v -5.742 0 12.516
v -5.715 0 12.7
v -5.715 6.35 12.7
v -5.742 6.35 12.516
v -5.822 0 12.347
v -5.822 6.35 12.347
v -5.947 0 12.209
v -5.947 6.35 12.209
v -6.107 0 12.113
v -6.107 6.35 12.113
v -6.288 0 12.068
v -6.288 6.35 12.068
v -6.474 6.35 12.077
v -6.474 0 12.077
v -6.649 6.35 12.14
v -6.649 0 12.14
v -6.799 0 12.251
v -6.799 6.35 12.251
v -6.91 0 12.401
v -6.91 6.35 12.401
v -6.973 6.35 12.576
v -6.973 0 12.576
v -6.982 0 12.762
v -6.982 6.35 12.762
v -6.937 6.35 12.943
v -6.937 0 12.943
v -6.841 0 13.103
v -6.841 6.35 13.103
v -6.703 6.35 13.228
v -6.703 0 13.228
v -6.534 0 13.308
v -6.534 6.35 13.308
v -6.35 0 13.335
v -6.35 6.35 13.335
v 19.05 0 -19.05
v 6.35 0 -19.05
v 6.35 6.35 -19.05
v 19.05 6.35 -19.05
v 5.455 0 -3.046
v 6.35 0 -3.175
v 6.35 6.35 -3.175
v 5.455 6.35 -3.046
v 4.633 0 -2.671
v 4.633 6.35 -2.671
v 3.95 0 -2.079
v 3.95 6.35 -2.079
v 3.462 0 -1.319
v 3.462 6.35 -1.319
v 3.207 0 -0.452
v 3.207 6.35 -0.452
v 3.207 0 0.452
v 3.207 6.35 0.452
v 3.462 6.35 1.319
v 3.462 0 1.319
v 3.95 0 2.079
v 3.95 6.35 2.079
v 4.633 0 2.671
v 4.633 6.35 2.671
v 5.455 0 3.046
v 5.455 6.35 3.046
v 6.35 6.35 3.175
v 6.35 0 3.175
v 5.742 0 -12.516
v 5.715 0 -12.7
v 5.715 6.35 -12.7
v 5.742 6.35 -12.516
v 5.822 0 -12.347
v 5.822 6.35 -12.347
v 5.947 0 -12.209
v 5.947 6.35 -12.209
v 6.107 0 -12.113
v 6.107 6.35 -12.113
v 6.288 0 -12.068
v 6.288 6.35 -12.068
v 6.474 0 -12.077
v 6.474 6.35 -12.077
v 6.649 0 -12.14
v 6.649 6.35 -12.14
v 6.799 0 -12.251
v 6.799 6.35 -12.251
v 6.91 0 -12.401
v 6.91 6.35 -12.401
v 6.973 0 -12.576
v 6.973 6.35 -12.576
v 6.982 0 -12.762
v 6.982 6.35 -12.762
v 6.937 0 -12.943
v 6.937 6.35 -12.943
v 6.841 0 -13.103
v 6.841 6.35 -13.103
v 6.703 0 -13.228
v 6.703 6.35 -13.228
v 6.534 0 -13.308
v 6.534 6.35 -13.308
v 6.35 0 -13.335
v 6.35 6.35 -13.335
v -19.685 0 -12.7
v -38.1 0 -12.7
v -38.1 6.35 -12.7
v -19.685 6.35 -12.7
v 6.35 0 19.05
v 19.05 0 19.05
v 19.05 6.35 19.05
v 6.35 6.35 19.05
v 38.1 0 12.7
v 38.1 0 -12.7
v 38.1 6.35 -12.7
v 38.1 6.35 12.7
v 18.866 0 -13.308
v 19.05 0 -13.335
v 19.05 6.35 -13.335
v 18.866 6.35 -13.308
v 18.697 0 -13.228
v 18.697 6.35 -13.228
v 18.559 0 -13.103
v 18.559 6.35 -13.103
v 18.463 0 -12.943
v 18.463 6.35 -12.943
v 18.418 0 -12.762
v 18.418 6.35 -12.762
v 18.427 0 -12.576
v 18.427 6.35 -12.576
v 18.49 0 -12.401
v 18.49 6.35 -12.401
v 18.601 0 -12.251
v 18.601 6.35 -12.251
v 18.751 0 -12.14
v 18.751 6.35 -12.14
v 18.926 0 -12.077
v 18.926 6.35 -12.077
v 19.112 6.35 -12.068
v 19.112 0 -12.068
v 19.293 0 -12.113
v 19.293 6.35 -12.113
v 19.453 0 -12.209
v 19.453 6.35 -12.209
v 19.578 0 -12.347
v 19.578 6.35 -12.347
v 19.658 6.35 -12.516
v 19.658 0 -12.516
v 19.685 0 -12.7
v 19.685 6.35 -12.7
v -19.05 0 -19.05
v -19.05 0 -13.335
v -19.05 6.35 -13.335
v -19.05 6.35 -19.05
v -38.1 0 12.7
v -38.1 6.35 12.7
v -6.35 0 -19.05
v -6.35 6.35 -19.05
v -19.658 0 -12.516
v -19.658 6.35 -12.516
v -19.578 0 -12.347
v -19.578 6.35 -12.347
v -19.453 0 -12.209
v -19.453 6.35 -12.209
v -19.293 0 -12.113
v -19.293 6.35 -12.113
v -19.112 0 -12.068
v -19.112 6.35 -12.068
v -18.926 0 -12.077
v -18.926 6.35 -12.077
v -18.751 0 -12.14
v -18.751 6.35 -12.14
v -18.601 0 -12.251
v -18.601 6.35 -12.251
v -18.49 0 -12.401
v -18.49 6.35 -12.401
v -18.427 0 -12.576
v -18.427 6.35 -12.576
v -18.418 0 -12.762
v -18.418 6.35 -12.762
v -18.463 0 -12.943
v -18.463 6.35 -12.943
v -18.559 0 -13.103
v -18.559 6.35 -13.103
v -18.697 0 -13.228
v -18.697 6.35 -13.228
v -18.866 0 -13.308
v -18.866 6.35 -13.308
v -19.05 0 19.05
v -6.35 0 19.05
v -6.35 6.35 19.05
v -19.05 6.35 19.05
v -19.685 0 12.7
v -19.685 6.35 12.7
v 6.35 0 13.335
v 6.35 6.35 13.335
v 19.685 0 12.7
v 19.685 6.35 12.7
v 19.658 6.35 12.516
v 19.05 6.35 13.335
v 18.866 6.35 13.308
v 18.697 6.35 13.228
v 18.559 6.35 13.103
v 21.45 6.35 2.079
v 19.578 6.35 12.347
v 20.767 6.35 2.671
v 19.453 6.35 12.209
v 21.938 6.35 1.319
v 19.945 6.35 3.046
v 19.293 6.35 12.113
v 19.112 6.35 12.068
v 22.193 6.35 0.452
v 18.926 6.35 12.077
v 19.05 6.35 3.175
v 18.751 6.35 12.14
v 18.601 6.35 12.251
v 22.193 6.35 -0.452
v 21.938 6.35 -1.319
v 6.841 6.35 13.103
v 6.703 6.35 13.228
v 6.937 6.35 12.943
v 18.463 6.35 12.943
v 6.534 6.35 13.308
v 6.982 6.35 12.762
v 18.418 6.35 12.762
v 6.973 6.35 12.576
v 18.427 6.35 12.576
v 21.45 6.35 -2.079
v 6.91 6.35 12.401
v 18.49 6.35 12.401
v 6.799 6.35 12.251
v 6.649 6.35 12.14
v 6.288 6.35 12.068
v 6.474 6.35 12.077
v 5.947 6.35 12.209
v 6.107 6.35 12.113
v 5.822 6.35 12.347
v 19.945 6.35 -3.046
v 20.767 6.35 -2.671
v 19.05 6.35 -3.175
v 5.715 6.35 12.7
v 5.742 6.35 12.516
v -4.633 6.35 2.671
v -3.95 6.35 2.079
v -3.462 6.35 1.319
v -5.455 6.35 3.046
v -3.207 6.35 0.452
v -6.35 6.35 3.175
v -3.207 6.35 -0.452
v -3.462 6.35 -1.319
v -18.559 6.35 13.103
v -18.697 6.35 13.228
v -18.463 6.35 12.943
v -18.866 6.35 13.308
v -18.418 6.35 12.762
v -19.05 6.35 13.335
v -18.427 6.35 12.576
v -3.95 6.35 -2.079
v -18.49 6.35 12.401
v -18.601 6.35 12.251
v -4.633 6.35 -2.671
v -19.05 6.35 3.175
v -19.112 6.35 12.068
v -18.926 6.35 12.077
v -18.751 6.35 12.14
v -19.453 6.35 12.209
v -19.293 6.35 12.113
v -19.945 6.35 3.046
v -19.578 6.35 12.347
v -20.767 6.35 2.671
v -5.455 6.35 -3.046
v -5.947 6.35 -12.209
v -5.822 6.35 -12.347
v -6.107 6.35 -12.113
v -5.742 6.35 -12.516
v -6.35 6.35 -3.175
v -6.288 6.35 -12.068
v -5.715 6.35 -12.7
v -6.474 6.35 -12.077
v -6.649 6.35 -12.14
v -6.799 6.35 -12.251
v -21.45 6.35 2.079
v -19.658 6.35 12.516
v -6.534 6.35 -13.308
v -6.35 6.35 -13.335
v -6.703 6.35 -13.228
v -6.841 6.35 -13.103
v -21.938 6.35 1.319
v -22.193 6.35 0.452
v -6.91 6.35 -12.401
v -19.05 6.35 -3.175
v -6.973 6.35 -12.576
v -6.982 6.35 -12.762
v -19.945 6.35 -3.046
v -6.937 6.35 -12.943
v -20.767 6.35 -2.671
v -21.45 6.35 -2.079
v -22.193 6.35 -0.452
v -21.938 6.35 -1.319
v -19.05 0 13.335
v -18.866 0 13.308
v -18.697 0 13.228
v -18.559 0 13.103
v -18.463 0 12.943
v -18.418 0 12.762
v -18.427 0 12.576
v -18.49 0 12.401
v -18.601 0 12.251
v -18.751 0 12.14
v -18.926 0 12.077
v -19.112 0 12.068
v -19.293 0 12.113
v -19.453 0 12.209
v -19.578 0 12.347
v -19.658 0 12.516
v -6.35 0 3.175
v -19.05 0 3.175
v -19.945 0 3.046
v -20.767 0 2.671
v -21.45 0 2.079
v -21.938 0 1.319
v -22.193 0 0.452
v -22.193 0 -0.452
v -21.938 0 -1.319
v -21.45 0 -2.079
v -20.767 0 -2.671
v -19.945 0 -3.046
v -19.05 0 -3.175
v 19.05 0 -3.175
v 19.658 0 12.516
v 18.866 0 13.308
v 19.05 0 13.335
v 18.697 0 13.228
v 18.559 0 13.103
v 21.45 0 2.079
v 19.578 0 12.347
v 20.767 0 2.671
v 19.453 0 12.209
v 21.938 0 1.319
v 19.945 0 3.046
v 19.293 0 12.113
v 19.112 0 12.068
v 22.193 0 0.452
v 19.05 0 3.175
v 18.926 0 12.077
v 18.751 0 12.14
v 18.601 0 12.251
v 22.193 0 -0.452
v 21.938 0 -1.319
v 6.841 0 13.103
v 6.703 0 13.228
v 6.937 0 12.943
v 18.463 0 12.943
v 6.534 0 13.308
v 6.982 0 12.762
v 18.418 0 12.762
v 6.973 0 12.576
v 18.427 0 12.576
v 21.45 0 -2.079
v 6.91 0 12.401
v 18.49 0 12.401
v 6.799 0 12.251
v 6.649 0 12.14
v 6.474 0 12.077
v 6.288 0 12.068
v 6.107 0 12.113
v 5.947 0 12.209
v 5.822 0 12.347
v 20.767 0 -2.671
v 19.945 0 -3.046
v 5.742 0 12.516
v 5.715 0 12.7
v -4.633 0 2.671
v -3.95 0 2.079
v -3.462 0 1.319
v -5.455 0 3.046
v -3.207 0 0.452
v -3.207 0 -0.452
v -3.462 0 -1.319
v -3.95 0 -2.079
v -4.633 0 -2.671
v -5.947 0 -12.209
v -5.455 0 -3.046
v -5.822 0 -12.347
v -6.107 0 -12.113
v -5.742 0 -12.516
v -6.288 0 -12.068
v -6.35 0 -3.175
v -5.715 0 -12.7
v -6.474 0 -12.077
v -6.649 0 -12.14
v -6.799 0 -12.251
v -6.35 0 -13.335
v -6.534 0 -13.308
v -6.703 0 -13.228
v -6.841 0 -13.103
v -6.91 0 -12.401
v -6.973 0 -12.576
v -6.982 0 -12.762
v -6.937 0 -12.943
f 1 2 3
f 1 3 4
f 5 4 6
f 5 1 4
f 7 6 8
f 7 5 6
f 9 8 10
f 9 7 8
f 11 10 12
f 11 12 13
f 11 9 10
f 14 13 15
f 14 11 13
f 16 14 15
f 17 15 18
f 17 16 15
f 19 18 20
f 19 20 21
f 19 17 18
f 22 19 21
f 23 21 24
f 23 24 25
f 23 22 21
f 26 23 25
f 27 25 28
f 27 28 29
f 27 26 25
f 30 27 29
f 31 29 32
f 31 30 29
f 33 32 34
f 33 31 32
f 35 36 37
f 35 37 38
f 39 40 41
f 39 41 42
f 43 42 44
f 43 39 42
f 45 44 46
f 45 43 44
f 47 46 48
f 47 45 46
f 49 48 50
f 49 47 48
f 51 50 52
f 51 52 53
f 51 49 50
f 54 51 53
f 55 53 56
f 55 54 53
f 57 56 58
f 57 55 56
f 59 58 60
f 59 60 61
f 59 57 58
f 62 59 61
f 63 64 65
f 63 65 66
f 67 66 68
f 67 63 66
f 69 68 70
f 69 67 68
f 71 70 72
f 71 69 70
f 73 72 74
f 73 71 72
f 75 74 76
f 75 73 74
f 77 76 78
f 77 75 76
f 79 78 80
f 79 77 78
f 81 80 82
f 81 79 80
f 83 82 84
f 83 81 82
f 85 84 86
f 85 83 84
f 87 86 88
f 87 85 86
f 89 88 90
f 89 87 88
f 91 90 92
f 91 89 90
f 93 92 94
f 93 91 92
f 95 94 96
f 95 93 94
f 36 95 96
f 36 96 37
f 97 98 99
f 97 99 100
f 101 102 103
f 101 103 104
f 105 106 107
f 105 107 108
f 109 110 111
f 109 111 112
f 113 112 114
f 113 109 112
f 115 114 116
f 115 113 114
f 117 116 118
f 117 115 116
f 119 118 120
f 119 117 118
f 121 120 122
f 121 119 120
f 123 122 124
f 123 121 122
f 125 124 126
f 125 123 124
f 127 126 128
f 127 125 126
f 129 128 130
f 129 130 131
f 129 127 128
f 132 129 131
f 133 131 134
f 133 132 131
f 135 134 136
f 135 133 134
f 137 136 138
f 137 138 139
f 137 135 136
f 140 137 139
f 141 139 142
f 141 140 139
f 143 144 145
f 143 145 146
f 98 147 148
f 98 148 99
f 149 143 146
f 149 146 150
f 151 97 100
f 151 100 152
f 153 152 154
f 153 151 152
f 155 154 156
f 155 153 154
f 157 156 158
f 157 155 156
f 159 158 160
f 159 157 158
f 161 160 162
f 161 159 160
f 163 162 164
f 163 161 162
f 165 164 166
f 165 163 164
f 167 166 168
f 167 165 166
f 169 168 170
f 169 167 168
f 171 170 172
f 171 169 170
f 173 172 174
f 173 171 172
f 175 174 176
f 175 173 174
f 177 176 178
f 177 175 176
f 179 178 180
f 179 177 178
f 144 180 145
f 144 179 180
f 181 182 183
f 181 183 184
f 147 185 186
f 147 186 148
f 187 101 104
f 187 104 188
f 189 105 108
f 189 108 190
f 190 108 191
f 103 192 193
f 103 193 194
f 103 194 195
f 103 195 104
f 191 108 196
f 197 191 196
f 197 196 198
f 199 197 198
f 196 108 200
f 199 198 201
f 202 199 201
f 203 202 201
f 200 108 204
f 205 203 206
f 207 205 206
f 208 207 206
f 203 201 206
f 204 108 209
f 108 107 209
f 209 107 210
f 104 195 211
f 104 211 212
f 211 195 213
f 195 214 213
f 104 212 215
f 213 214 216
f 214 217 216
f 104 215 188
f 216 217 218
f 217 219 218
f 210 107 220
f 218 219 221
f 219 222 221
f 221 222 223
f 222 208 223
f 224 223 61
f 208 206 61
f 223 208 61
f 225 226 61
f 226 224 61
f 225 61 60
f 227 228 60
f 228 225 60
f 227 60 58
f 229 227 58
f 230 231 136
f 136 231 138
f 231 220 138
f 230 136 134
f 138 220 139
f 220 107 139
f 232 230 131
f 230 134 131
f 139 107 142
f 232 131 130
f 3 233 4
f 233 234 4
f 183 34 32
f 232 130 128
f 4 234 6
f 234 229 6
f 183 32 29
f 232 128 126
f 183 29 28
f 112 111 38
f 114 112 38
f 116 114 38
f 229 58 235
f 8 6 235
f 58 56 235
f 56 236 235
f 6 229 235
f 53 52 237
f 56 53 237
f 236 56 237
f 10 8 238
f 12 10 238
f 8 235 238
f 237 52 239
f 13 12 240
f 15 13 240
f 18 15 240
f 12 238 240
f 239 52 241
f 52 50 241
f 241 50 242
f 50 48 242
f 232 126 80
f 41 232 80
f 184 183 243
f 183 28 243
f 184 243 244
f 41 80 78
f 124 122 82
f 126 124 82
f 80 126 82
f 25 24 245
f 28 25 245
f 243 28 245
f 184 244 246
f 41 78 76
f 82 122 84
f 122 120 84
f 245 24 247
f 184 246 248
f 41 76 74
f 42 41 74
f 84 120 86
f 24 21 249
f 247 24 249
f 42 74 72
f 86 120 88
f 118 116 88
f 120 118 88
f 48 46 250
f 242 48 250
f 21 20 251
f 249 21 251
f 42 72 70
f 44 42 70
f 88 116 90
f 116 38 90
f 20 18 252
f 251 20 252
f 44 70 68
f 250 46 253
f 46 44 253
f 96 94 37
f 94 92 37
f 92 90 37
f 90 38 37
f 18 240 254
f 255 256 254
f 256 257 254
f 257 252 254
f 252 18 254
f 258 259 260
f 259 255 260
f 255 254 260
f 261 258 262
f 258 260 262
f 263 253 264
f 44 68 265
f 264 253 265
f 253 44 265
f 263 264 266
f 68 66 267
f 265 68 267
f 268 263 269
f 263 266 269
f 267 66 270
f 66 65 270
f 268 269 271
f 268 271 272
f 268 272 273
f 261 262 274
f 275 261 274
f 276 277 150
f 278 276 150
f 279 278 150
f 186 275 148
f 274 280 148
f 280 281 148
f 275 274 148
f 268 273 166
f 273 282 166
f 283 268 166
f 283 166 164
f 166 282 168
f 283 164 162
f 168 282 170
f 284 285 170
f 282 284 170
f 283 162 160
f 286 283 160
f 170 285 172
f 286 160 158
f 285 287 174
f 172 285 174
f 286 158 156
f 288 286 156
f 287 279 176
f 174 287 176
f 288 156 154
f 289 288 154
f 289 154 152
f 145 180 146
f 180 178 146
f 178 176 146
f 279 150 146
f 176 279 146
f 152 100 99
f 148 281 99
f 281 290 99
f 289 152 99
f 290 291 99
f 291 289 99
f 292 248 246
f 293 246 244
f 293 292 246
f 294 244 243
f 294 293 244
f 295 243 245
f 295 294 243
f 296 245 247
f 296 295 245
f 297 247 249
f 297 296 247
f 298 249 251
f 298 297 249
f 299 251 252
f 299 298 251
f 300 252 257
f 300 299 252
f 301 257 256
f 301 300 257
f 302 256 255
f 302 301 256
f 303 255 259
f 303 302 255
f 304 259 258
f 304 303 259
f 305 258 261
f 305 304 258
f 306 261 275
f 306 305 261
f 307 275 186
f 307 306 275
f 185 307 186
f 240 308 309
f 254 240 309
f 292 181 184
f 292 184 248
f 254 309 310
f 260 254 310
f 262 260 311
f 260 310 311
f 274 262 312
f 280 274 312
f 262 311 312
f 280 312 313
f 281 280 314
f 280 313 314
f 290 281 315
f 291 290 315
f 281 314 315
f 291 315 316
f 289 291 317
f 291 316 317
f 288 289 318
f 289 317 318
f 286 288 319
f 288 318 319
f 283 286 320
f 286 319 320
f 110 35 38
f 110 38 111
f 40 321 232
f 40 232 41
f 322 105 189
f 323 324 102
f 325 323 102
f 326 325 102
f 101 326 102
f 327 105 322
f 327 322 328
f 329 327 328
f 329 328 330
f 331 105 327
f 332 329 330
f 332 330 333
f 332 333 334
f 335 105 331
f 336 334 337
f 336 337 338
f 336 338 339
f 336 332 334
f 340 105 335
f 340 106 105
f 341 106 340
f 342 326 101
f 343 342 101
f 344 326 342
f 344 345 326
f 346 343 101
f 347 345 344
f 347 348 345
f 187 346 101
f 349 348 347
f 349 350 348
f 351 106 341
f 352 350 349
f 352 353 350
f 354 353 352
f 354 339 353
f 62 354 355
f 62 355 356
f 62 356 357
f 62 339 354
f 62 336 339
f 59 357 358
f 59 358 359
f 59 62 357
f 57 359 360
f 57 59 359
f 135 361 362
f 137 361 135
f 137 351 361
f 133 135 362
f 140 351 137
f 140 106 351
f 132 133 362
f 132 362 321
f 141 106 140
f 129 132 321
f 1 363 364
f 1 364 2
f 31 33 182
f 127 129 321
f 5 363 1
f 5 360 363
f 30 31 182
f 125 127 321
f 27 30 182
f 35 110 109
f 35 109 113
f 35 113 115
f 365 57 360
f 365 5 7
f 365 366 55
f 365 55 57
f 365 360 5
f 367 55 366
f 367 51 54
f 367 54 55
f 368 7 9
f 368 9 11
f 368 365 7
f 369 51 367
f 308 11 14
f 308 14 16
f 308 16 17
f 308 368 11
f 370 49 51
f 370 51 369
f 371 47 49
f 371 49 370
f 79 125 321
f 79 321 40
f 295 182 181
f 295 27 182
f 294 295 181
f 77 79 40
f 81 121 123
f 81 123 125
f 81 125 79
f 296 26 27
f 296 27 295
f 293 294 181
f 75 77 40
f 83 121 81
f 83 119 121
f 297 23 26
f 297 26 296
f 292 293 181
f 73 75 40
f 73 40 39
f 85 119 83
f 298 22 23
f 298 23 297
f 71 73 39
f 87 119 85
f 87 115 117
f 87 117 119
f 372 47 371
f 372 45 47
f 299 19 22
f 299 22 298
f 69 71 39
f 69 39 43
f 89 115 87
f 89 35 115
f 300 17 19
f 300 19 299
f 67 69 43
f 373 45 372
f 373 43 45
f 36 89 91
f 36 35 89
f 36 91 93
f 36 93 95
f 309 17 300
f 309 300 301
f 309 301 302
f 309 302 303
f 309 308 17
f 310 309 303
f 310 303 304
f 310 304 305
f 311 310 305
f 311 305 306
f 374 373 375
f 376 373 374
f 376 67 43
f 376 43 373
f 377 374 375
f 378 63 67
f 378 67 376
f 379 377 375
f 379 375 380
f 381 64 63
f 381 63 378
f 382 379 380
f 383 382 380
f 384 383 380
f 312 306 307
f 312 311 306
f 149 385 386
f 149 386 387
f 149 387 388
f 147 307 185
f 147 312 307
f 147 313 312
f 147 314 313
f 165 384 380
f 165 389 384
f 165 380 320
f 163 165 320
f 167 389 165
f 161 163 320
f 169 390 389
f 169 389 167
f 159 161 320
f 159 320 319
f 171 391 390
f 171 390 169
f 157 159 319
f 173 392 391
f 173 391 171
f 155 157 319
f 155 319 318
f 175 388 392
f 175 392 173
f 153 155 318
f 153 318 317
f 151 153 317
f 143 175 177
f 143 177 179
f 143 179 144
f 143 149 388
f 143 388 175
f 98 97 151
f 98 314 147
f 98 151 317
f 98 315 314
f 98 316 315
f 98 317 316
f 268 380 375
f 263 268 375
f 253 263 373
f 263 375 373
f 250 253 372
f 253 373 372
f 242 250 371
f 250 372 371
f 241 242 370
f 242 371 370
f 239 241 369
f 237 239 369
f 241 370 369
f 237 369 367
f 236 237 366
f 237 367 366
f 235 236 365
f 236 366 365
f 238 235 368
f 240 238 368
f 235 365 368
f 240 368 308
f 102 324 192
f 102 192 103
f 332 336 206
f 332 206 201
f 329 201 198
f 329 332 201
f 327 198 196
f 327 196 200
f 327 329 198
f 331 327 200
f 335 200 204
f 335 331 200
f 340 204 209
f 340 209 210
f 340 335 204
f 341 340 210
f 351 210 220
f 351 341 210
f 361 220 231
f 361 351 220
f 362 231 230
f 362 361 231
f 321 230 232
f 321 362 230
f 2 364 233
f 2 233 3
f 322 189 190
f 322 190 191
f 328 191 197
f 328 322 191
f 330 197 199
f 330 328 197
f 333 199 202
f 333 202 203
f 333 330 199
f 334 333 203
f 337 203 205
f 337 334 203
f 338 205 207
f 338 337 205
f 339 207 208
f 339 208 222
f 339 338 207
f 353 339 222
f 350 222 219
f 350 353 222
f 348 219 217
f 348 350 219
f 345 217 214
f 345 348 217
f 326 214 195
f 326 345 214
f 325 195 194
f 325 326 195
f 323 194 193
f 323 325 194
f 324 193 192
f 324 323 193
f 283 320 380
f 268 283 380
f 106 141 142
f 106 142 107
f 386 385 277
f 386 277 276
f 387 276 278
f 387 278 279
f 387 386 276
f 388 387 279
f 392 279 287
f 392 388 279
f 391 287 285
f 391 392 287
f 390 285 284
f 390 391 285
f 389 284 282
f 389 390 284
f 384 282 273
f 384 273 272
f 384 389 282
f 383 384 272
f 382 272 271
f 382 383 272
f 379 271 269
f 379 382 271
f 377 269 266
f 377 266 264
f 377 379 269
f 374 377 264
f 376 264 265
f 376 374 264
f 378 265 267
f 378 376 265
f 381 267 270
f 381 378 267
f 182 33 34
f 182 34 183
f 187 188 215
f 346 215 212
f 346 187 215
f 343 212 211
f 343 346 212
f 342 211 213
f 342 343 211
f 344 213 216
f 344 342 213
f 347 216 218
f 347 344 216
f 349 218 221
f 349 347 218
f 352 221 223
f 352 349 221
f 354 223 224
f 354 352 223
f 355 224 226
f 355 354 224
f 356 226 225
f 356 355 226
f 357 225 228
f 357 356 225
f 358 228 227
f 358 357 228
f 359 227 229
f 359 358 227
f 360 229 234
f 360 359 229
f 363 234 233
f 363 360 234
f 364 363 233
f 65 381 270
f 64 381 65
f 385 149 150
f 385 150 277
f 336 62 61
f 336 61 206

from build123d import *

# Parameters (mm, degrees)
BOSS_EXTRUDE1_DEPTH = 6.35
CUT_EXTRUDE1_REACH  = 45.068
SKETCH2_R           = 3.175
CUT_EXTRUDE2_START  = -6.35
SKETCH4_R           = 0.635
CUT_EXTRUDE2_DEPTH  = 6.35
CUT_EXTRUDE3_START  = -6.35
CUT_EXTRUDE3_DEPTH  = 6.35


with BuildPart() as part:
    # Sketch1 → Boss-Extrude1 (new body)
    with BuildSketch(Plane(origin=(0, 0, 0), x_dir=(1, 0, 0), z_dir=(0, 1, 0))):
        Polygon((-19.05, 12.7), (-19.05, 19.05), (-6.35, 19.05), (-6.35, 12.7), (6.35, 12.7), (6.35, 19.05), (19.05, 19.05), (19.05, 12.7), (38.1, 12.7), (38.1, -12.7), (19.05, -12.7), (19.05, -19.05), (6.35, -19.05), (6.35, -12.7), (-6.35, -12.7), (-6.35, -19.05), (-19.05, -19.05), (-19.05, -12.7), (-38.1, -12.7), (-38.1, 12.7), align=None)
    extrude(amount=BOSS_EXTRUDE1_DEPTH)

    # Sketch2 → Cut-Extrude1 (cut, up to next)
    with BuildSketch(Plane(origin=(0, 6.35, 0), x_dir=(1, 0, 0), z_dir=(0, 1, 0)), mode=Mode.PRIVATE) as cut_extrude1_sk1:
        with Locations(Location((-12.7, 0, 0), (0, 0, 270))):
            Circle(SKETCH2_R)
    cut_extrude1_tool1 = extrude(cut_extrude1_sk1.sketch, amount=-CUT_EXTRUDE1_REACH, mode=Mode.PRIVATE) & part.part
    # Sketch2 → Cut-Extrude1 (cut, up to next)
    with BuildSketch(Plane(origin=(0, 6.35, 0), x_dir=(1, 0, 0), z_dir=(0, 1, 0)), mode=Mode.PRIVATE) as cut_extrude1_sk2:
        with Locations(Location((12.7, 0, 0), (0, 0, 270))):
            Circle(SKETCH2_R)
    cut_extrude1_tool2 = extrude(cut_extrude1_sk2.sketch, amount=-CUT_EXTRUDE1_REACH, mode=Mode.PRIVATE) & part.part
    add(cut_extrude1_tool1.solids().sort_by_distance((-12.7, 6.35, 0))[0], mode=Mode.SUBTRACT)
    add(cut_extrude1_tool2.solids().sort_by_distance((12.7, 6.35, 0))[0], mode=Mode.SUBTRACT)

    # Sketch4 → Cut-Extrude2 (cut)
    with BuildSketch(Plane(origin=(0, 6.35, 0), x_dir=(1, 0, 0), z_dir=(0, 1, 0)).offset(CUT_EXTRUDE2_START)):
        with Locations((-19.05, 12.7)):
            Circle(SKETCH4_R)
    cut_extrude2 = extrude(amount=CUT_EXTRUDE2_DEPTH, mode=Mode.SUBTRACT)

    # Sketch-Pattern1: Cut-Extrude2 at 7 more places
    with Locations((12.7, 0, 0), (25.4, 0, 0), (38.1, 0, 0), (38.1, 0, 25.4), (25.4, 0, 25.4), (12.7, 0, 25.4), (0, 0, 25.4)):
        add(cut_extrude2, mode=Mode.SUBTRACT)

    # Sketch5 → Cut-Extrude3 (cut)
    with BuildSketch(Plane(origin=(0, 6.35, 0), x_dir=(1, 0, 0), z_dir=(0, 1, 0)).offset(CUT_EXTRUDE3_START)):
        with BuildLine():
            Line((-19.05, 3.175), (-6.35, 3.175))
            ThreePointArc((-6.35, 3.175), (-3.175, 0), (-6.35, -3.175))
            Line((-6.35, -3.175), (-19.05, -3.175))
            ThreePointArc((-19.05, -3.175), (-22.225, 0), (-19.05, 3.175))
        make_face()
        with BuildLine():
            Line((19.05, 3.175), (6.35, 3.175))
            ThreePointArc((6.35, 3.175), (3.175, 0), (6.35, -3.175))
            Line((6.35, -3.175), (19.05, -3.175))
            ThreePointArc((19.05, -3.175), (22.225, 0), (19.05, 3.175))
        make_face()
    extrude(amount=CUT_EXTRUDE3_DEPTH, mode=Mode.SUBTRACT)


solid = part.part
